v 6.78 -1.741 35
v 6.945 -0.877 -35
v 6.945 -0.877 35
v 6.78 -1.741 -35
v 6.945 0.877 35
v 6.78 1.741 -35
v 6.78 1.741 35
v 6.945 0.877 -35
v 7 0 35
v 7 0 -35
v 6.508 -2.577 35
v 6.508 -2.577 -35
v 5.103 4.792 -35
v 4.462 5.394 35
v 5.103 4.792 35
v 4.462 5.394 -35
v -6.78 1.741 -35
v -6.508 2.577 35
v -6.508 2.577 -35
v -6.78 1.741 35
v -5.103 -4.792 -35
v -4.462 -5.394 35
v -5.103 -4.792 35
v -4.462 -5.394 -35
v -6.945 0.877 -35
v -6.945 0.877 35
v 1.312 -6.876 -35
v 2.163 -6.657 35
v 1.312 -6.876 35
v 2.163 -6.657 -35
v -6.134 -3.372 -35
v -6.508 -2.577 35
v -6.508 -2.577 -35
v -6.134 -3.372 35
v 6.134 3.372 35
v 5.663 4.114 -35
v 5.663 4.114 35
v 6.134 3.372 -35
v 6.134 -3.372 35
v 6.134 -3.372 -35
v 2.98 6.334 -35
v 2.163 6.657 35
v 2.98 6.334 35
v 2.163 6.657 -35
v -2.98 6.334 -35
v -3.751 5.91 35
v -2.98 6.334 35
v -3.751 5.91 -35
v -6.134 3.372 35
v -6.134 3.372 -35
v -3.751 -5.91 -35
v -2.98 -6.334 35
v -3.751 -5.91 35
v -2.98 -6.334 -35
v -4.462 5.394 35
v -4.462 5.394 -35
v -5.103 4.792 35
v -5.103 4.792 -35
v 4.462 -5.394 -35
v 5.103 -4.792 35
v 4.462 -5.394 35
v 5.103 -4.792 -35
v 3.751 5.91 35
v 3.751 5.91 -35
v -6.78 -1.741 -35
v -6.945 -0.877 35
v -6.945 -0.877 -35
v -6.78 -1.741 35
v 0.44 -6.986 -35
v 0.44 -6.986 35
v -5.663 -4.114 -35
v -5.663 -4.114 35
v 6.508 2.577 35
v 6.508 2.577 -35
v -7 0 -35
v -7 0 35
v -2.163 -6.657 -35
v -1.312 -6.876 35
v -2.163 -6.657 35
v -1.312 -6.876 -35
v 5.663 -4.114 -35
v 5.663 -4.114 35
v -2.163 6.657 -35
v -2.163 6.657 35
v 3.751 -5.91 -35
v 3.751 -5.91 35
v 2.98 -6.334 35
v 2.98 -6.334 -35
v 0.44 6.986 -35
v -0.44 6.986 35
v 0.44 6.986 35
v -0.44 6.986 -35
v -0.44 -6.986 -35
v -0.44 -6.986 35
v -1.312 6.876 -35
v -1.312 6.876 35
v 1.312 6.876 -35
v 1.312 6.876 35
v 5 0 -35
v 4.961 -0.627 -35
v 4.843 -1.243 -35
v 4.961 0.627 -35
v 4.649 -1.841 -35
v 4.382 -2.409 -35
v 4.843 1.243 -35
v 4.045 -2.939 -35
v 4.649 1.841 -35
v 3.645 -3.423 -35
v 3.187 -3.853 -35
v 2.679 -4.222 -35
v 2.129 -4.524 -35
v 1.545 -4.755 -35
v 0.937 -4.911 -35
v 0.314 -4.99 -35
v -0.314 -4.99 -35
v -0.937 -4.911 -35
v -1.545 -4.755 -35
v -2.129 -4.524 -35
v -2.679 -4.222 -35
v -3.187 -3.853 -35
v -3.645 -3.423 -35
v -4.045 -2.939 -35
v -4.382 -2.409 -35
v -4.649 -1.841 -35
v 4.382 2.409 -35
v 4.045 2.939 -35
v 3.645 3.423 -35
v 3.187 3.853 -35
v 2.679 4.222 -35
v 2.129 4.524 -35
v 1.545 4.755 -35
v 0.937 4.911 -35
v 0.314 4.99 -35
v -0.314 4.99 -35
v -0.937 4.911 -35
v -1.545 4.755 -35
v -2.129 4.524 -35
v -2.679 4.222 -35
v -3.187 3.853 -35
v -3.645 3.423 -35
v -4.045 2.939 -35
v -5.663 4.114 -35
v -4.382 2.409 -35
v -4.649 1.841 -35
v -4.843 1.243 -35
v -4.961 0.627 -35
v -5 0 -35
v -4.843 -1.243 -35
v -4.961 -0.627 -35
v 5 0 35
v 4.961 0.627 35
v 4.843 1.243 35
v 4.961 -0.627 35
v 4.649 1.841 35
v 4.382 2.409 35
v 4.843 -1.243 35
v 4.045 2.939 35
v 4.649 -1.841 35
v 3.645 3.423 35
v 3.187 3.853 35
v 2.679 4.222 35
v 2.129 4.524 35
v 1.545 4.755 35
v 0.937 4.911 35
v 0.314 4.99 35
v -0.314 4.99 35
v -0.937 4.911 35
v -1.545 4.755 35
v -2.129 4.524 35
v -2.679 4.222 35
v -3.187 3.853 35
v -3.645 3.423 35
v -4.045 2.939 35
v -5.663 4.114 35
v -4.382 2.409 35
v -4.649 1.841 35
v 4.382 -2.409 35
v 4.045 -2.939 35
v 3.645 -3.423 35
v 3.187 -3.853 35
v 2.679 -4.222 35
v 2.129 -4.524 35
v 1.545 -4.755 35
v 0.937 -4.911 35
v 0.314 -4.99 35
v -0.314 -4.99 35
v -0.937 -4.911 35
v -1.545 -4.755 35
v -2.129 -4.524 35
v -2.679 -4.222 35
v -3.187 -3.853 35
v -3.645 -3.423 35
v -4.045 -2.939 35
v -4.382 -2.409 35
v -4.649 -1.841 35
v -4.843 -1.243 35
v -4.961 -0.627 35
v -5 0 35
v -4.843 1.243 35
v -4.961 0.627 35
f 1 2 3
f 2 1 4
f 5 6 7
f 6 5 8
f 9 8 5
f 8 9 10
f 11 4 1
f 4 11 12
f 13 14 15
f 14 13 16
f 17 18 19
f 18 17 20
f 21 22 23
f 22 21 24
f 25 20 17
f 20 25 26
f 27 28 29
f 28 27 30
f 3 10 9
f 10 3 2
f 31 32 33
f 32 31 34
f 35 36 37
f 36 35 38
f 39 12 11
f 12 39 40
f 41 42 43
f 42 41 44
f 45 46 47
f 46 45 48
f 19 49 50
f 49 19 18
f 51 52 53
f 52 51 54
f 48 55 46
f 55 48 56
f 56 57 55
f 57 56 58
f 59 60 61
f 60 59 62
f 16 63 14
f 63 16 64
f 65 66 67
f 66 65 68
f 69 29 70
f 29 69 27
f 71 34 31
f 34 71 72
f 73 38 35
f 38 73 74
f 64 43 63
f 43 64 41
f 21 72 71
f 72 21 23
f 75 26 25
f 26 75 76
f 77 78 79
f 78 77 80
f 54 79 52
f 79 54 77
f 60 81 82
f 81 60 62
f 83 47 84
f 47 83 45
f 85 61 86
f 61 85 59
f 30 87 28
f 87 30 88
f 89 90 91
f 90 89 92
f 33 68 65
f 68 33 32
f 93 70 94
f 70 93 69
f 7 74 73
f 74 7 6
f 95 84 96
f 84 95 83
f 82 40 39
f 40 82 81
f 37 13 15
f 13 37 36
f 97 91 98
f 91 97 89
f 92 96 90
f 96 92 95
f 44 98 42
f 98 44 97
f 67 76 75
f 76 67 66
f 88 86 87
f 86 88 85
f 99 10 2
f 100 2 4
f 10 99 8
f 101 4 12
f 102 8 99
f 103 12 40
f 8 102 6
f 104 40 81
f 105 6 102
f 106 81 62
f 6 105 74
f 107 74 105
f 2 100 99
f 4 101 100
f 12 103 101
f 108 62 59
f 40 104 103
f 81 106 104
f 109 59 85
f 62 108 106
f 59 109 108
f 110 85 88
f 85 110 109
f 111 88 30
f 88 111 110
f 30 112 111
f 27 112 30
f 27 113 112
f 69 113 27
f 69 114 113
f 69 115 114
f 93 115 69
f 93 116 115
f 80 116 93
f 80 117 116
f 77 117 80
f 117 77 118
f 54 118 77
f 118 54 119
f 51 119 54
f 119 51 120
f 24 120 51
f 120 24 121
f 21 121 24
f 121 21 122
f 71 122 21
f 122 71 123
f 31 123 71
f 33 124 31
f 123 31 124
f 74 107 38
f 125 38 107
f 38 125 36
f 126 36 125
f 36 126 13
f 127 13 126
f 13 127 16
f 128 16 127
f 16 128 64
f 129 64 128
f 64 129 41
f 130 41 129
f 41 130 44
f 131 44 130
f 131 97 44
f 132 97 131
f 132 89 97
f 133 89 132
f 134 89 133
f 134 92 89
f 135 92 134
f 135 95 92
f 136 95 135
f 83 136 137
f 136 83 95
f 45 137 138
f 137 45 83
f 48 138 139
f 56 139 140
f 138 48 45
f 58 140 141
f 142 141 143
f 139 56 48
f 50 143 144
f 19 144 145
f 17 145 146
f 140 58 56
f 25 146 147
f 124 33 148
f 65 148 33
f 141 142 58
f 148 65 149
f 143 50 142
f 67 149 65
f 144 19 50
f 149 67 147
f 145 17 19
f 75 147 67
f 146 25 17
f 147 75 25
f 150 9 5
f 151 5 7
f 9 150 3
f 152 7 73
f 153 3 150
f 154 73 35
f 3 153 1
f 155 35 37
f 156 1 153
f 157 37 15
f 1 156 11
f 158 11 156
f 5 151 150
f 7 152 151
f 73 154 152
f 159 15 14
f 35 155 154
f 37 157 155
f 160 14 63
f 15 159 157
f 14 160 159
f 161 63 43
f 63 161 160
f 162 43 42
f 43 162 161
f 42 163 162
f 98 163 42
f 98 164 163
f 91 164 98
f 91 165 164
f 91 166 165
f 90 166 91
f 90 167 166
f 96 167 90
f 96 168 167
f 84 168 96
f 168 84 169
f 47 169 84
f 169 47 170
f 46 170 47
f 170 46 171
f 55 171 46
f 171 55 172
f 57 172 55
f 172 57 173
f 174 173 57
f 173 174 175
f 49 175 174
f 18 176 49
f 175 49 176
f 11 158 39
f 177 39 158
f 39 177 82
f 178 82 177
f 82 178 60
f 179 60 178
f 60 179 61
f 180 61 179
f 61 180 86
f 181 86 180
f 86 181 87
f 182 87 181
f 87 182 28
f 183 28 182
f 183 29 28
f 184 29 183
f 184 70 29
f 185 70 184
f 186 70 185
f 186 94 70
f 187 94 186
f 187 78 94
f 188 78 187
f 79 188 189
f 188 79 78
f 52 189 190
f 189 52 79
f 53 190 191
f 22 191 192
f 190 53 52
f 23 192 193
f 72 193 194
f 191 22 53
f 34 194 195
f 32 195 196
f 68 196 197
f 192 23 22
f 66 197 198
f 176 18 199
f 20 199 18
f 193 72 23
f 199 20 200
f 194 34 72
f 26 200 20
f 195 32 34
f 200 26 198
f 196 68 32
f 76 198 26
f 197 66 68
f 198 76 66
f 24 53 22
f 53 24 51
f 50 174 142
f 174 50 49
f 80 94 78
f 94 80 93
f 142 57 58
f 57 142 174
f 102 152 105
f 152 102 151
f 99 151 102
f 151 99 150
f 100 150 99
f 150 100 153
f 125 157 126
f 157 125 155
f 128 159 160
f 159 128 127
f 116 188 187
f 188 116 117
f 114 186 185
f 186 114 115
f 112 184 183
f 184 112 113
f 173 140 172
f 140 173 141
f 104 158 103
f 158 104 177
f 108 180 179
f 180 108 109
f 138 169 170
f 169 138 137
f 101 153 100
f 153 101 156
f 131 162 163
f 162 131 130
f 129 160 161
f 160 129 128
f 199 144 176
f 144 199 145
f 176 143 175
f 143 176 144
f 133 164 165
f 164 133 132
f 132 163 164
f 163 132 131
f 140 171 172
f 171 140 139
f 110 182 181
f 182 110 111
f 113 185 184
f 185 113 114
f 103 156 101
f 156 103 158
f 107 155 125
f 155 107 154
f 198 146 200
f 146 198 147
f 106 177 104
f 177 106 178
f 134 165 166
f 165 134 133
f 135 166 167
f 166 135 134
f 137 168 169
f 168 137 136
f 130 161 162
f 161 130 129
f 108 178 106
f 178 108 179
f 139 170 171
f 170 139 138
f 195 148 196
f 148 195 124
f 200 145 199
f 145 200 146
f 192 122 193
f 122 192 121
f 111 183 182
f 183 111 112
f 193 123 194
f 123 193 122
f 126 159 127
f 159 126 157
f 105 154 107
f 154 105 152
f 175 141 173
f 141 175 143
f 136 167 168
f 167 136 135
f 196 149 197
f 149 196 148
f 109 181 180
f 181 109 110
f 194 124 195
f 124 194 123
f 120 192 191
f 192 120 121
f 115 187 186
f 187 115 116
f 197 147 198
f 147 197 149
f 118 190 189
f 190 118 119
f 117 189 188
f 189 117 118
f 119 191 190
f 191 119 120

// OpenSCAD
$fn = 50;


difference() {
	union() {
		translate(v = [0, 0, -35.0000000000]) {
			cylinder(h = 70, r = 7.0000000000);
		}
	}
	union() {
		translate(v = [0, 0, -100.0000000000]) {
			cylinder(h = 200, r = 5.0000000000);
		}
	}
}
